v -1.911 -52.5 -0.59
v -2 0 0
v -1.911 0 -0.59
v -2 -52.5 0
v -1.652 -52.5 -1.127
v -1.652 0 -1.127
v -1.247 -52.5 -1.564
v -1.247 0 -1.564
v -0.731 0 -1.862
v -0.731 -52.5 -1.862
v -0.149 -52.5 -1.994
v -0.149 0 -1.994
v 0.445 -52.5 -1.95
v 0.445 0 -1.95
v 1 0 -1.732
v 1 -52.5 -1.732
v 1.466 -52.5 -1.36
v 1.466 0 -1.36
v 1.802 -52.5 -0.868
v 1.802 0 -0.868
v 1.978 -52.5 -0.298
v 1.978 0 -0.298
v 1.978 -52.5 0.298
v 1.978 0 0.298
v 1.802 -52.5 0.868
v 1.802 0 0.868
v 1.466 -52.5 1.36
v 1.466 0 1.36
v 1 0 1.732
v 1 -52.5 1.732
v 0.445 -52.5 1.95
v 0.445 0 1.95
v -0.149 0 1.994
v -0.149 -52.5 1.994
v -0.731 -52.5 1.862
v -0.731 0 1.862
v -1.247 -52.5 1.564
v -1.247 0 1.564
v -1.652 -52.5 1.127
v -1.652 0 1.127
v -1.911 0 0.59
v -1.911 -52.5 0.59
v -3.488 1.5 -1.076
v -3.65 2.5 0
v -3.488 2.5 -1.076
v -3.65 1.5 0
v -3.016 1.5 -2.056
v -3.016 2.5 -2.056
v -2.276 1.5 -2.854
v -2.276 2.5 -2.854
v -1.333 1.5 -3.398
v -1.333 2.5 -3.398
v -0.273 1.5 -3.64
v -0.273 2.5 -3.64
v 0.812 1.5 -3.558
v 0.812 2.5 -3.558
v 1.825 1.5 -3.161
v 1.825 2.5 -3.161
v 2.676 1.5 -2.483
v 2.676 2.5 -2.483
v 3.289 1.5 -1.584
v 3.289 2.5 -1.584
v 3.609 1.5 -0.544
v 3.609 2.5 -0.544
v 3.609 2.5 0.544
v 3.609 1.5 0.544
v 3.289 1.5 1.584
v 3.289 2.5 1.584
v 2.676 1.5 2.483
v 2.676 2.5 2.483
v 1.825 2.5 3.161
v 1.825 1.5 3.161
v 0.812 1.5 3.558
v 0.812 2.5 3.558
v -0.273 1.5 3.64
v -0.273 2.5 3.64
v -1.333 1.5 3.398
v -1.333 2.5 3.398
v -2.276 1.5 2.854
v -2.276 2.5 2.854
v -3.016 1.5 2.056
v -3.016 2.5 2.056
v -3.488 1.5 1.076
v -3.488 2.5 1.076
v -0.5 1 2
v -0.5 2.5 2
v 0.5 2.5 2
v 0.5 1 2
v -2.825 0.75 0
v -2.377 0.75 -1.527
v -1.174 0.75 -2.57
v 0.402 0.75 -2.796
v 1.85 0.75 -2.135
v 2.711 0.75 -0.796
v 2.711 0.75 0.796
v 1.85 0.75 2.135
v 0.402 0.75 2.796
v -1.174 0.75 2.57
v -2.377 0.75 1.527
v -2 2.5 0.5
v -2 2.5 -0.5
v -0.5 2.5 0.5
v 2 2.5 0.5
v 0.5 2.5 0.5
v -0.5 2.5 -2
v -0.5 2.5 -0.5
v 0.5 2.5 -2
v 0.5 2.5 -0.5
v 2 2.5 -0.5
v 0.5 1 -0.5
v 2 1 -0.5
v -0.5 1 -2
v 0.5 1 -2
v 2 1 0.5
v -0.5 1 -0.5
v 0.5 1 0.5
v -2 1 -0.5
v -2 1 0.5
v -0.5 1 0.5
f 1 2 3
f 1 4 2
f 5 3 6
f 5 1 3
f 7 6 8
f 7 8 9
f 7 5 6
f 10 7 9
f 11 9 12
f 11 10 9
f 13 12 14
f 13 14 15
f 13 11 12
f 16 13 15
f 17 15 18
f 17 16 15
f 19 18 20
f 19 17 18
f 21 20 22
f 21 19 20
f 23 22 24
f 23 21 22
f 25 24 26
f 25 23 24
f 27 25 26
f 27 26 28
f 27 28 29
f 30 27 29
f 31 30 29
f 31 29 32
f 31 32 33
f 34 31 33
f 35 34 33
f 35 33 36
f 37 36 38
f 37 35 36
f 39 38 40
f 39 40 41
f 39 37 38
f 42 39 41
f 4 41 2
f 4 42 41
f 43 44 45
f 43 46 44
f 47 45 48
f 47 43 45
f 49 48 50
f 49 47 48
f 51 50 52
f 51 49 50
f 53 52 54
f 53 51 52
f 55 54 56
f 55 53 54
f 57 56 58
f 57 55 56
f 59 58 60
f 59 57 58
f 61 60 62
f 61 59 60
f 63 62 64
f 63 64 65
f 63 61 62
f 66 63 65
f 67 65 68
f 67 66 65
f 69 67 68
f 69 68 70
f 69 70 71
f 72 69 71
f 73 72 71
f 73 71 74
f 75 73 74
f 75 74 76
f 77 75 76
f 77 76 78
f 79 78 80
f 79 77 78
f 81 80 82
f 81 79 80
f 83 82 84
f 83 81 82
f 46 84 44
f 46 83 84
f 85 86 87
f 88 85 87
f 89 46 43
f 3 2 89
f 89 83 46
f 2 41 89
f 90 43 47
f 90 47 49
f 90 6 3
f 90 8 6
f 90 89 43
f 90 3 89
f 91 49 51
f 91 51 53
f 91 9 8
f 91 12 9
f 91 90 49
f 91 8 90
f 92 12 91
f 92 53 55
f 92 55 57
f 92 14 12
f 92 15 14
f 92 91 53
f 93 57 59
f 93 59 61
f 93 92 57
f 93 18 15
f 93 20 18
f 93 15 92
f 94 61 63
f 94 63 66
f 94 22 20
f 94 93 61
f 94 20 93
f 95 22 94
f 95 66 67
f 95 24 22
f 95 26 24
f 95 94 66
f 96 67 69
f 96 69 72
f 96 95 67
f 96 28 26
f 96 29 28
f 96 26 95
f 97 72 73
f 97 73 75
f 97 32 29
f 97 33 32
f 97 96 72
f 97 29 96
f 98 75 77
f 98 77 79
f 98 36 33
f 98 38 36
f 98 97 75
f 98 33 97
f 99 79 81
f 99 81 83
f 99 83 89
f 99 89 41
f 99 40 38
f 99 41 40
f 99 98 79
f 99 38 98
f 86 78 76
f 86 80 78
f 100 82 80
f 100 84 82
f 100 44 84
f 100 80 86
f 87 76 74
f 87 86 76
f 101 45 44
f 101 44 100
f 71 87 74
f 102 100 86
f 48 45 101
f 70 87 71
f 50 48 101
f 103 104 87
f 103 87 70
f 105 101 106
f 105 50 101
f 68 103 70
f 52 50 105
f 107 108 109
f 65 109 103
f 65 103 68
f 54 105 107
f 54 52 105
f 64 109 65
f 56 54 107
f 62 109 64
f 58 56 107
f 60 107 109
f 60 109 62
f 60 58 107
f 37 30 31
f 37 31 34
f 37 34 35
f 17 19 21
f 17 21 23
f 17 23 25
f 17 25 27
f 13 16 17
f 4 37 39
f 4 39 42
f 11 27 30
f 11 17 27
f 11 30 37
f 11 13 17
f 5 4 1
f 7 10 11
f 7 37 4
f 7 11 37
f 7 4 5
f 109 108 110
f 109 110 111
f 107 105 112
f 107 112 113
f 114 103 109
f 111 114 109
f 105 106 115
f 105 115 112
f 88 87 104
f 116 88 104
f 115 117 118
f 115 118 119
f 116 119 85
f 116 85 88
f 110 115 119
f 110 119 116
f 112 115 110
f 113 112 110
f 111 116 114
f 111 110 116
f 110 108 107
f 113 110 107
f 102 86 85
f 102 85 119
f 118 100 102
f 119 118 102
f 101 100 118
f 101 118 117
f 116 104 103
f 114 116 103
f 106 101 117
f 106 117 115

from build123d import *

# Parameters (mm, degrees)
SKETCH3_W          = 1.5
SKETCH3_H          = 1
SKETCH3_W_2        = 1
SKETCH3_H_2        = 1.5
CUT_EXTRUDE1_DEPTH = 1.5


with BuildPart() as part:
    # Sketch2 → Revolve1 (revolve)
    with BuildSketch(Plane.XY, mode=Mode.PRIVATE) as revolve1_sk:
        Polygon((0, 2.5), (3.65, 2.5), (3.65, 1.5), (2, 0), (2, -52.5), (0, -52.5), align=None)
    revolve(revolve1_sk.sketch.rotate(Axis((0, 27.929971315, 0), (0, -1, 0)), 180), axis=Axis((0, 27.929971315, 0), (0, -1, 0)))

    # Sketch3 → Cut-Extrude1 (cut)
    with BuildSketch(Plane(origin=(0, 2.5, 0), x_dir=(1, 0, 0), z_dir=(0, 1, 0))):
        with Locations((1.25, 0)):
            Rectangle(SKETCH3_W, SKETCH3_H)
        with Locations((0, 1.25)):
            Rectangle(SKETCH3_W_2, SKETCH3_H_2)
        with Locations((-1.25, 0)):
            Rectangle(SKETCH3_W, SKETCH3_H)
        Rectangle(SKETCH3_W_2, SKETCH3_H)
        with Locations((0, -1.25)):
            Rectangle(SKETCH3_W_2, SKETCH3_H_2)
    extrude(amount=-CUT_EXTRUDE1_DEPTH, mode=Mode.SUBTRACT)


solid = part.part
